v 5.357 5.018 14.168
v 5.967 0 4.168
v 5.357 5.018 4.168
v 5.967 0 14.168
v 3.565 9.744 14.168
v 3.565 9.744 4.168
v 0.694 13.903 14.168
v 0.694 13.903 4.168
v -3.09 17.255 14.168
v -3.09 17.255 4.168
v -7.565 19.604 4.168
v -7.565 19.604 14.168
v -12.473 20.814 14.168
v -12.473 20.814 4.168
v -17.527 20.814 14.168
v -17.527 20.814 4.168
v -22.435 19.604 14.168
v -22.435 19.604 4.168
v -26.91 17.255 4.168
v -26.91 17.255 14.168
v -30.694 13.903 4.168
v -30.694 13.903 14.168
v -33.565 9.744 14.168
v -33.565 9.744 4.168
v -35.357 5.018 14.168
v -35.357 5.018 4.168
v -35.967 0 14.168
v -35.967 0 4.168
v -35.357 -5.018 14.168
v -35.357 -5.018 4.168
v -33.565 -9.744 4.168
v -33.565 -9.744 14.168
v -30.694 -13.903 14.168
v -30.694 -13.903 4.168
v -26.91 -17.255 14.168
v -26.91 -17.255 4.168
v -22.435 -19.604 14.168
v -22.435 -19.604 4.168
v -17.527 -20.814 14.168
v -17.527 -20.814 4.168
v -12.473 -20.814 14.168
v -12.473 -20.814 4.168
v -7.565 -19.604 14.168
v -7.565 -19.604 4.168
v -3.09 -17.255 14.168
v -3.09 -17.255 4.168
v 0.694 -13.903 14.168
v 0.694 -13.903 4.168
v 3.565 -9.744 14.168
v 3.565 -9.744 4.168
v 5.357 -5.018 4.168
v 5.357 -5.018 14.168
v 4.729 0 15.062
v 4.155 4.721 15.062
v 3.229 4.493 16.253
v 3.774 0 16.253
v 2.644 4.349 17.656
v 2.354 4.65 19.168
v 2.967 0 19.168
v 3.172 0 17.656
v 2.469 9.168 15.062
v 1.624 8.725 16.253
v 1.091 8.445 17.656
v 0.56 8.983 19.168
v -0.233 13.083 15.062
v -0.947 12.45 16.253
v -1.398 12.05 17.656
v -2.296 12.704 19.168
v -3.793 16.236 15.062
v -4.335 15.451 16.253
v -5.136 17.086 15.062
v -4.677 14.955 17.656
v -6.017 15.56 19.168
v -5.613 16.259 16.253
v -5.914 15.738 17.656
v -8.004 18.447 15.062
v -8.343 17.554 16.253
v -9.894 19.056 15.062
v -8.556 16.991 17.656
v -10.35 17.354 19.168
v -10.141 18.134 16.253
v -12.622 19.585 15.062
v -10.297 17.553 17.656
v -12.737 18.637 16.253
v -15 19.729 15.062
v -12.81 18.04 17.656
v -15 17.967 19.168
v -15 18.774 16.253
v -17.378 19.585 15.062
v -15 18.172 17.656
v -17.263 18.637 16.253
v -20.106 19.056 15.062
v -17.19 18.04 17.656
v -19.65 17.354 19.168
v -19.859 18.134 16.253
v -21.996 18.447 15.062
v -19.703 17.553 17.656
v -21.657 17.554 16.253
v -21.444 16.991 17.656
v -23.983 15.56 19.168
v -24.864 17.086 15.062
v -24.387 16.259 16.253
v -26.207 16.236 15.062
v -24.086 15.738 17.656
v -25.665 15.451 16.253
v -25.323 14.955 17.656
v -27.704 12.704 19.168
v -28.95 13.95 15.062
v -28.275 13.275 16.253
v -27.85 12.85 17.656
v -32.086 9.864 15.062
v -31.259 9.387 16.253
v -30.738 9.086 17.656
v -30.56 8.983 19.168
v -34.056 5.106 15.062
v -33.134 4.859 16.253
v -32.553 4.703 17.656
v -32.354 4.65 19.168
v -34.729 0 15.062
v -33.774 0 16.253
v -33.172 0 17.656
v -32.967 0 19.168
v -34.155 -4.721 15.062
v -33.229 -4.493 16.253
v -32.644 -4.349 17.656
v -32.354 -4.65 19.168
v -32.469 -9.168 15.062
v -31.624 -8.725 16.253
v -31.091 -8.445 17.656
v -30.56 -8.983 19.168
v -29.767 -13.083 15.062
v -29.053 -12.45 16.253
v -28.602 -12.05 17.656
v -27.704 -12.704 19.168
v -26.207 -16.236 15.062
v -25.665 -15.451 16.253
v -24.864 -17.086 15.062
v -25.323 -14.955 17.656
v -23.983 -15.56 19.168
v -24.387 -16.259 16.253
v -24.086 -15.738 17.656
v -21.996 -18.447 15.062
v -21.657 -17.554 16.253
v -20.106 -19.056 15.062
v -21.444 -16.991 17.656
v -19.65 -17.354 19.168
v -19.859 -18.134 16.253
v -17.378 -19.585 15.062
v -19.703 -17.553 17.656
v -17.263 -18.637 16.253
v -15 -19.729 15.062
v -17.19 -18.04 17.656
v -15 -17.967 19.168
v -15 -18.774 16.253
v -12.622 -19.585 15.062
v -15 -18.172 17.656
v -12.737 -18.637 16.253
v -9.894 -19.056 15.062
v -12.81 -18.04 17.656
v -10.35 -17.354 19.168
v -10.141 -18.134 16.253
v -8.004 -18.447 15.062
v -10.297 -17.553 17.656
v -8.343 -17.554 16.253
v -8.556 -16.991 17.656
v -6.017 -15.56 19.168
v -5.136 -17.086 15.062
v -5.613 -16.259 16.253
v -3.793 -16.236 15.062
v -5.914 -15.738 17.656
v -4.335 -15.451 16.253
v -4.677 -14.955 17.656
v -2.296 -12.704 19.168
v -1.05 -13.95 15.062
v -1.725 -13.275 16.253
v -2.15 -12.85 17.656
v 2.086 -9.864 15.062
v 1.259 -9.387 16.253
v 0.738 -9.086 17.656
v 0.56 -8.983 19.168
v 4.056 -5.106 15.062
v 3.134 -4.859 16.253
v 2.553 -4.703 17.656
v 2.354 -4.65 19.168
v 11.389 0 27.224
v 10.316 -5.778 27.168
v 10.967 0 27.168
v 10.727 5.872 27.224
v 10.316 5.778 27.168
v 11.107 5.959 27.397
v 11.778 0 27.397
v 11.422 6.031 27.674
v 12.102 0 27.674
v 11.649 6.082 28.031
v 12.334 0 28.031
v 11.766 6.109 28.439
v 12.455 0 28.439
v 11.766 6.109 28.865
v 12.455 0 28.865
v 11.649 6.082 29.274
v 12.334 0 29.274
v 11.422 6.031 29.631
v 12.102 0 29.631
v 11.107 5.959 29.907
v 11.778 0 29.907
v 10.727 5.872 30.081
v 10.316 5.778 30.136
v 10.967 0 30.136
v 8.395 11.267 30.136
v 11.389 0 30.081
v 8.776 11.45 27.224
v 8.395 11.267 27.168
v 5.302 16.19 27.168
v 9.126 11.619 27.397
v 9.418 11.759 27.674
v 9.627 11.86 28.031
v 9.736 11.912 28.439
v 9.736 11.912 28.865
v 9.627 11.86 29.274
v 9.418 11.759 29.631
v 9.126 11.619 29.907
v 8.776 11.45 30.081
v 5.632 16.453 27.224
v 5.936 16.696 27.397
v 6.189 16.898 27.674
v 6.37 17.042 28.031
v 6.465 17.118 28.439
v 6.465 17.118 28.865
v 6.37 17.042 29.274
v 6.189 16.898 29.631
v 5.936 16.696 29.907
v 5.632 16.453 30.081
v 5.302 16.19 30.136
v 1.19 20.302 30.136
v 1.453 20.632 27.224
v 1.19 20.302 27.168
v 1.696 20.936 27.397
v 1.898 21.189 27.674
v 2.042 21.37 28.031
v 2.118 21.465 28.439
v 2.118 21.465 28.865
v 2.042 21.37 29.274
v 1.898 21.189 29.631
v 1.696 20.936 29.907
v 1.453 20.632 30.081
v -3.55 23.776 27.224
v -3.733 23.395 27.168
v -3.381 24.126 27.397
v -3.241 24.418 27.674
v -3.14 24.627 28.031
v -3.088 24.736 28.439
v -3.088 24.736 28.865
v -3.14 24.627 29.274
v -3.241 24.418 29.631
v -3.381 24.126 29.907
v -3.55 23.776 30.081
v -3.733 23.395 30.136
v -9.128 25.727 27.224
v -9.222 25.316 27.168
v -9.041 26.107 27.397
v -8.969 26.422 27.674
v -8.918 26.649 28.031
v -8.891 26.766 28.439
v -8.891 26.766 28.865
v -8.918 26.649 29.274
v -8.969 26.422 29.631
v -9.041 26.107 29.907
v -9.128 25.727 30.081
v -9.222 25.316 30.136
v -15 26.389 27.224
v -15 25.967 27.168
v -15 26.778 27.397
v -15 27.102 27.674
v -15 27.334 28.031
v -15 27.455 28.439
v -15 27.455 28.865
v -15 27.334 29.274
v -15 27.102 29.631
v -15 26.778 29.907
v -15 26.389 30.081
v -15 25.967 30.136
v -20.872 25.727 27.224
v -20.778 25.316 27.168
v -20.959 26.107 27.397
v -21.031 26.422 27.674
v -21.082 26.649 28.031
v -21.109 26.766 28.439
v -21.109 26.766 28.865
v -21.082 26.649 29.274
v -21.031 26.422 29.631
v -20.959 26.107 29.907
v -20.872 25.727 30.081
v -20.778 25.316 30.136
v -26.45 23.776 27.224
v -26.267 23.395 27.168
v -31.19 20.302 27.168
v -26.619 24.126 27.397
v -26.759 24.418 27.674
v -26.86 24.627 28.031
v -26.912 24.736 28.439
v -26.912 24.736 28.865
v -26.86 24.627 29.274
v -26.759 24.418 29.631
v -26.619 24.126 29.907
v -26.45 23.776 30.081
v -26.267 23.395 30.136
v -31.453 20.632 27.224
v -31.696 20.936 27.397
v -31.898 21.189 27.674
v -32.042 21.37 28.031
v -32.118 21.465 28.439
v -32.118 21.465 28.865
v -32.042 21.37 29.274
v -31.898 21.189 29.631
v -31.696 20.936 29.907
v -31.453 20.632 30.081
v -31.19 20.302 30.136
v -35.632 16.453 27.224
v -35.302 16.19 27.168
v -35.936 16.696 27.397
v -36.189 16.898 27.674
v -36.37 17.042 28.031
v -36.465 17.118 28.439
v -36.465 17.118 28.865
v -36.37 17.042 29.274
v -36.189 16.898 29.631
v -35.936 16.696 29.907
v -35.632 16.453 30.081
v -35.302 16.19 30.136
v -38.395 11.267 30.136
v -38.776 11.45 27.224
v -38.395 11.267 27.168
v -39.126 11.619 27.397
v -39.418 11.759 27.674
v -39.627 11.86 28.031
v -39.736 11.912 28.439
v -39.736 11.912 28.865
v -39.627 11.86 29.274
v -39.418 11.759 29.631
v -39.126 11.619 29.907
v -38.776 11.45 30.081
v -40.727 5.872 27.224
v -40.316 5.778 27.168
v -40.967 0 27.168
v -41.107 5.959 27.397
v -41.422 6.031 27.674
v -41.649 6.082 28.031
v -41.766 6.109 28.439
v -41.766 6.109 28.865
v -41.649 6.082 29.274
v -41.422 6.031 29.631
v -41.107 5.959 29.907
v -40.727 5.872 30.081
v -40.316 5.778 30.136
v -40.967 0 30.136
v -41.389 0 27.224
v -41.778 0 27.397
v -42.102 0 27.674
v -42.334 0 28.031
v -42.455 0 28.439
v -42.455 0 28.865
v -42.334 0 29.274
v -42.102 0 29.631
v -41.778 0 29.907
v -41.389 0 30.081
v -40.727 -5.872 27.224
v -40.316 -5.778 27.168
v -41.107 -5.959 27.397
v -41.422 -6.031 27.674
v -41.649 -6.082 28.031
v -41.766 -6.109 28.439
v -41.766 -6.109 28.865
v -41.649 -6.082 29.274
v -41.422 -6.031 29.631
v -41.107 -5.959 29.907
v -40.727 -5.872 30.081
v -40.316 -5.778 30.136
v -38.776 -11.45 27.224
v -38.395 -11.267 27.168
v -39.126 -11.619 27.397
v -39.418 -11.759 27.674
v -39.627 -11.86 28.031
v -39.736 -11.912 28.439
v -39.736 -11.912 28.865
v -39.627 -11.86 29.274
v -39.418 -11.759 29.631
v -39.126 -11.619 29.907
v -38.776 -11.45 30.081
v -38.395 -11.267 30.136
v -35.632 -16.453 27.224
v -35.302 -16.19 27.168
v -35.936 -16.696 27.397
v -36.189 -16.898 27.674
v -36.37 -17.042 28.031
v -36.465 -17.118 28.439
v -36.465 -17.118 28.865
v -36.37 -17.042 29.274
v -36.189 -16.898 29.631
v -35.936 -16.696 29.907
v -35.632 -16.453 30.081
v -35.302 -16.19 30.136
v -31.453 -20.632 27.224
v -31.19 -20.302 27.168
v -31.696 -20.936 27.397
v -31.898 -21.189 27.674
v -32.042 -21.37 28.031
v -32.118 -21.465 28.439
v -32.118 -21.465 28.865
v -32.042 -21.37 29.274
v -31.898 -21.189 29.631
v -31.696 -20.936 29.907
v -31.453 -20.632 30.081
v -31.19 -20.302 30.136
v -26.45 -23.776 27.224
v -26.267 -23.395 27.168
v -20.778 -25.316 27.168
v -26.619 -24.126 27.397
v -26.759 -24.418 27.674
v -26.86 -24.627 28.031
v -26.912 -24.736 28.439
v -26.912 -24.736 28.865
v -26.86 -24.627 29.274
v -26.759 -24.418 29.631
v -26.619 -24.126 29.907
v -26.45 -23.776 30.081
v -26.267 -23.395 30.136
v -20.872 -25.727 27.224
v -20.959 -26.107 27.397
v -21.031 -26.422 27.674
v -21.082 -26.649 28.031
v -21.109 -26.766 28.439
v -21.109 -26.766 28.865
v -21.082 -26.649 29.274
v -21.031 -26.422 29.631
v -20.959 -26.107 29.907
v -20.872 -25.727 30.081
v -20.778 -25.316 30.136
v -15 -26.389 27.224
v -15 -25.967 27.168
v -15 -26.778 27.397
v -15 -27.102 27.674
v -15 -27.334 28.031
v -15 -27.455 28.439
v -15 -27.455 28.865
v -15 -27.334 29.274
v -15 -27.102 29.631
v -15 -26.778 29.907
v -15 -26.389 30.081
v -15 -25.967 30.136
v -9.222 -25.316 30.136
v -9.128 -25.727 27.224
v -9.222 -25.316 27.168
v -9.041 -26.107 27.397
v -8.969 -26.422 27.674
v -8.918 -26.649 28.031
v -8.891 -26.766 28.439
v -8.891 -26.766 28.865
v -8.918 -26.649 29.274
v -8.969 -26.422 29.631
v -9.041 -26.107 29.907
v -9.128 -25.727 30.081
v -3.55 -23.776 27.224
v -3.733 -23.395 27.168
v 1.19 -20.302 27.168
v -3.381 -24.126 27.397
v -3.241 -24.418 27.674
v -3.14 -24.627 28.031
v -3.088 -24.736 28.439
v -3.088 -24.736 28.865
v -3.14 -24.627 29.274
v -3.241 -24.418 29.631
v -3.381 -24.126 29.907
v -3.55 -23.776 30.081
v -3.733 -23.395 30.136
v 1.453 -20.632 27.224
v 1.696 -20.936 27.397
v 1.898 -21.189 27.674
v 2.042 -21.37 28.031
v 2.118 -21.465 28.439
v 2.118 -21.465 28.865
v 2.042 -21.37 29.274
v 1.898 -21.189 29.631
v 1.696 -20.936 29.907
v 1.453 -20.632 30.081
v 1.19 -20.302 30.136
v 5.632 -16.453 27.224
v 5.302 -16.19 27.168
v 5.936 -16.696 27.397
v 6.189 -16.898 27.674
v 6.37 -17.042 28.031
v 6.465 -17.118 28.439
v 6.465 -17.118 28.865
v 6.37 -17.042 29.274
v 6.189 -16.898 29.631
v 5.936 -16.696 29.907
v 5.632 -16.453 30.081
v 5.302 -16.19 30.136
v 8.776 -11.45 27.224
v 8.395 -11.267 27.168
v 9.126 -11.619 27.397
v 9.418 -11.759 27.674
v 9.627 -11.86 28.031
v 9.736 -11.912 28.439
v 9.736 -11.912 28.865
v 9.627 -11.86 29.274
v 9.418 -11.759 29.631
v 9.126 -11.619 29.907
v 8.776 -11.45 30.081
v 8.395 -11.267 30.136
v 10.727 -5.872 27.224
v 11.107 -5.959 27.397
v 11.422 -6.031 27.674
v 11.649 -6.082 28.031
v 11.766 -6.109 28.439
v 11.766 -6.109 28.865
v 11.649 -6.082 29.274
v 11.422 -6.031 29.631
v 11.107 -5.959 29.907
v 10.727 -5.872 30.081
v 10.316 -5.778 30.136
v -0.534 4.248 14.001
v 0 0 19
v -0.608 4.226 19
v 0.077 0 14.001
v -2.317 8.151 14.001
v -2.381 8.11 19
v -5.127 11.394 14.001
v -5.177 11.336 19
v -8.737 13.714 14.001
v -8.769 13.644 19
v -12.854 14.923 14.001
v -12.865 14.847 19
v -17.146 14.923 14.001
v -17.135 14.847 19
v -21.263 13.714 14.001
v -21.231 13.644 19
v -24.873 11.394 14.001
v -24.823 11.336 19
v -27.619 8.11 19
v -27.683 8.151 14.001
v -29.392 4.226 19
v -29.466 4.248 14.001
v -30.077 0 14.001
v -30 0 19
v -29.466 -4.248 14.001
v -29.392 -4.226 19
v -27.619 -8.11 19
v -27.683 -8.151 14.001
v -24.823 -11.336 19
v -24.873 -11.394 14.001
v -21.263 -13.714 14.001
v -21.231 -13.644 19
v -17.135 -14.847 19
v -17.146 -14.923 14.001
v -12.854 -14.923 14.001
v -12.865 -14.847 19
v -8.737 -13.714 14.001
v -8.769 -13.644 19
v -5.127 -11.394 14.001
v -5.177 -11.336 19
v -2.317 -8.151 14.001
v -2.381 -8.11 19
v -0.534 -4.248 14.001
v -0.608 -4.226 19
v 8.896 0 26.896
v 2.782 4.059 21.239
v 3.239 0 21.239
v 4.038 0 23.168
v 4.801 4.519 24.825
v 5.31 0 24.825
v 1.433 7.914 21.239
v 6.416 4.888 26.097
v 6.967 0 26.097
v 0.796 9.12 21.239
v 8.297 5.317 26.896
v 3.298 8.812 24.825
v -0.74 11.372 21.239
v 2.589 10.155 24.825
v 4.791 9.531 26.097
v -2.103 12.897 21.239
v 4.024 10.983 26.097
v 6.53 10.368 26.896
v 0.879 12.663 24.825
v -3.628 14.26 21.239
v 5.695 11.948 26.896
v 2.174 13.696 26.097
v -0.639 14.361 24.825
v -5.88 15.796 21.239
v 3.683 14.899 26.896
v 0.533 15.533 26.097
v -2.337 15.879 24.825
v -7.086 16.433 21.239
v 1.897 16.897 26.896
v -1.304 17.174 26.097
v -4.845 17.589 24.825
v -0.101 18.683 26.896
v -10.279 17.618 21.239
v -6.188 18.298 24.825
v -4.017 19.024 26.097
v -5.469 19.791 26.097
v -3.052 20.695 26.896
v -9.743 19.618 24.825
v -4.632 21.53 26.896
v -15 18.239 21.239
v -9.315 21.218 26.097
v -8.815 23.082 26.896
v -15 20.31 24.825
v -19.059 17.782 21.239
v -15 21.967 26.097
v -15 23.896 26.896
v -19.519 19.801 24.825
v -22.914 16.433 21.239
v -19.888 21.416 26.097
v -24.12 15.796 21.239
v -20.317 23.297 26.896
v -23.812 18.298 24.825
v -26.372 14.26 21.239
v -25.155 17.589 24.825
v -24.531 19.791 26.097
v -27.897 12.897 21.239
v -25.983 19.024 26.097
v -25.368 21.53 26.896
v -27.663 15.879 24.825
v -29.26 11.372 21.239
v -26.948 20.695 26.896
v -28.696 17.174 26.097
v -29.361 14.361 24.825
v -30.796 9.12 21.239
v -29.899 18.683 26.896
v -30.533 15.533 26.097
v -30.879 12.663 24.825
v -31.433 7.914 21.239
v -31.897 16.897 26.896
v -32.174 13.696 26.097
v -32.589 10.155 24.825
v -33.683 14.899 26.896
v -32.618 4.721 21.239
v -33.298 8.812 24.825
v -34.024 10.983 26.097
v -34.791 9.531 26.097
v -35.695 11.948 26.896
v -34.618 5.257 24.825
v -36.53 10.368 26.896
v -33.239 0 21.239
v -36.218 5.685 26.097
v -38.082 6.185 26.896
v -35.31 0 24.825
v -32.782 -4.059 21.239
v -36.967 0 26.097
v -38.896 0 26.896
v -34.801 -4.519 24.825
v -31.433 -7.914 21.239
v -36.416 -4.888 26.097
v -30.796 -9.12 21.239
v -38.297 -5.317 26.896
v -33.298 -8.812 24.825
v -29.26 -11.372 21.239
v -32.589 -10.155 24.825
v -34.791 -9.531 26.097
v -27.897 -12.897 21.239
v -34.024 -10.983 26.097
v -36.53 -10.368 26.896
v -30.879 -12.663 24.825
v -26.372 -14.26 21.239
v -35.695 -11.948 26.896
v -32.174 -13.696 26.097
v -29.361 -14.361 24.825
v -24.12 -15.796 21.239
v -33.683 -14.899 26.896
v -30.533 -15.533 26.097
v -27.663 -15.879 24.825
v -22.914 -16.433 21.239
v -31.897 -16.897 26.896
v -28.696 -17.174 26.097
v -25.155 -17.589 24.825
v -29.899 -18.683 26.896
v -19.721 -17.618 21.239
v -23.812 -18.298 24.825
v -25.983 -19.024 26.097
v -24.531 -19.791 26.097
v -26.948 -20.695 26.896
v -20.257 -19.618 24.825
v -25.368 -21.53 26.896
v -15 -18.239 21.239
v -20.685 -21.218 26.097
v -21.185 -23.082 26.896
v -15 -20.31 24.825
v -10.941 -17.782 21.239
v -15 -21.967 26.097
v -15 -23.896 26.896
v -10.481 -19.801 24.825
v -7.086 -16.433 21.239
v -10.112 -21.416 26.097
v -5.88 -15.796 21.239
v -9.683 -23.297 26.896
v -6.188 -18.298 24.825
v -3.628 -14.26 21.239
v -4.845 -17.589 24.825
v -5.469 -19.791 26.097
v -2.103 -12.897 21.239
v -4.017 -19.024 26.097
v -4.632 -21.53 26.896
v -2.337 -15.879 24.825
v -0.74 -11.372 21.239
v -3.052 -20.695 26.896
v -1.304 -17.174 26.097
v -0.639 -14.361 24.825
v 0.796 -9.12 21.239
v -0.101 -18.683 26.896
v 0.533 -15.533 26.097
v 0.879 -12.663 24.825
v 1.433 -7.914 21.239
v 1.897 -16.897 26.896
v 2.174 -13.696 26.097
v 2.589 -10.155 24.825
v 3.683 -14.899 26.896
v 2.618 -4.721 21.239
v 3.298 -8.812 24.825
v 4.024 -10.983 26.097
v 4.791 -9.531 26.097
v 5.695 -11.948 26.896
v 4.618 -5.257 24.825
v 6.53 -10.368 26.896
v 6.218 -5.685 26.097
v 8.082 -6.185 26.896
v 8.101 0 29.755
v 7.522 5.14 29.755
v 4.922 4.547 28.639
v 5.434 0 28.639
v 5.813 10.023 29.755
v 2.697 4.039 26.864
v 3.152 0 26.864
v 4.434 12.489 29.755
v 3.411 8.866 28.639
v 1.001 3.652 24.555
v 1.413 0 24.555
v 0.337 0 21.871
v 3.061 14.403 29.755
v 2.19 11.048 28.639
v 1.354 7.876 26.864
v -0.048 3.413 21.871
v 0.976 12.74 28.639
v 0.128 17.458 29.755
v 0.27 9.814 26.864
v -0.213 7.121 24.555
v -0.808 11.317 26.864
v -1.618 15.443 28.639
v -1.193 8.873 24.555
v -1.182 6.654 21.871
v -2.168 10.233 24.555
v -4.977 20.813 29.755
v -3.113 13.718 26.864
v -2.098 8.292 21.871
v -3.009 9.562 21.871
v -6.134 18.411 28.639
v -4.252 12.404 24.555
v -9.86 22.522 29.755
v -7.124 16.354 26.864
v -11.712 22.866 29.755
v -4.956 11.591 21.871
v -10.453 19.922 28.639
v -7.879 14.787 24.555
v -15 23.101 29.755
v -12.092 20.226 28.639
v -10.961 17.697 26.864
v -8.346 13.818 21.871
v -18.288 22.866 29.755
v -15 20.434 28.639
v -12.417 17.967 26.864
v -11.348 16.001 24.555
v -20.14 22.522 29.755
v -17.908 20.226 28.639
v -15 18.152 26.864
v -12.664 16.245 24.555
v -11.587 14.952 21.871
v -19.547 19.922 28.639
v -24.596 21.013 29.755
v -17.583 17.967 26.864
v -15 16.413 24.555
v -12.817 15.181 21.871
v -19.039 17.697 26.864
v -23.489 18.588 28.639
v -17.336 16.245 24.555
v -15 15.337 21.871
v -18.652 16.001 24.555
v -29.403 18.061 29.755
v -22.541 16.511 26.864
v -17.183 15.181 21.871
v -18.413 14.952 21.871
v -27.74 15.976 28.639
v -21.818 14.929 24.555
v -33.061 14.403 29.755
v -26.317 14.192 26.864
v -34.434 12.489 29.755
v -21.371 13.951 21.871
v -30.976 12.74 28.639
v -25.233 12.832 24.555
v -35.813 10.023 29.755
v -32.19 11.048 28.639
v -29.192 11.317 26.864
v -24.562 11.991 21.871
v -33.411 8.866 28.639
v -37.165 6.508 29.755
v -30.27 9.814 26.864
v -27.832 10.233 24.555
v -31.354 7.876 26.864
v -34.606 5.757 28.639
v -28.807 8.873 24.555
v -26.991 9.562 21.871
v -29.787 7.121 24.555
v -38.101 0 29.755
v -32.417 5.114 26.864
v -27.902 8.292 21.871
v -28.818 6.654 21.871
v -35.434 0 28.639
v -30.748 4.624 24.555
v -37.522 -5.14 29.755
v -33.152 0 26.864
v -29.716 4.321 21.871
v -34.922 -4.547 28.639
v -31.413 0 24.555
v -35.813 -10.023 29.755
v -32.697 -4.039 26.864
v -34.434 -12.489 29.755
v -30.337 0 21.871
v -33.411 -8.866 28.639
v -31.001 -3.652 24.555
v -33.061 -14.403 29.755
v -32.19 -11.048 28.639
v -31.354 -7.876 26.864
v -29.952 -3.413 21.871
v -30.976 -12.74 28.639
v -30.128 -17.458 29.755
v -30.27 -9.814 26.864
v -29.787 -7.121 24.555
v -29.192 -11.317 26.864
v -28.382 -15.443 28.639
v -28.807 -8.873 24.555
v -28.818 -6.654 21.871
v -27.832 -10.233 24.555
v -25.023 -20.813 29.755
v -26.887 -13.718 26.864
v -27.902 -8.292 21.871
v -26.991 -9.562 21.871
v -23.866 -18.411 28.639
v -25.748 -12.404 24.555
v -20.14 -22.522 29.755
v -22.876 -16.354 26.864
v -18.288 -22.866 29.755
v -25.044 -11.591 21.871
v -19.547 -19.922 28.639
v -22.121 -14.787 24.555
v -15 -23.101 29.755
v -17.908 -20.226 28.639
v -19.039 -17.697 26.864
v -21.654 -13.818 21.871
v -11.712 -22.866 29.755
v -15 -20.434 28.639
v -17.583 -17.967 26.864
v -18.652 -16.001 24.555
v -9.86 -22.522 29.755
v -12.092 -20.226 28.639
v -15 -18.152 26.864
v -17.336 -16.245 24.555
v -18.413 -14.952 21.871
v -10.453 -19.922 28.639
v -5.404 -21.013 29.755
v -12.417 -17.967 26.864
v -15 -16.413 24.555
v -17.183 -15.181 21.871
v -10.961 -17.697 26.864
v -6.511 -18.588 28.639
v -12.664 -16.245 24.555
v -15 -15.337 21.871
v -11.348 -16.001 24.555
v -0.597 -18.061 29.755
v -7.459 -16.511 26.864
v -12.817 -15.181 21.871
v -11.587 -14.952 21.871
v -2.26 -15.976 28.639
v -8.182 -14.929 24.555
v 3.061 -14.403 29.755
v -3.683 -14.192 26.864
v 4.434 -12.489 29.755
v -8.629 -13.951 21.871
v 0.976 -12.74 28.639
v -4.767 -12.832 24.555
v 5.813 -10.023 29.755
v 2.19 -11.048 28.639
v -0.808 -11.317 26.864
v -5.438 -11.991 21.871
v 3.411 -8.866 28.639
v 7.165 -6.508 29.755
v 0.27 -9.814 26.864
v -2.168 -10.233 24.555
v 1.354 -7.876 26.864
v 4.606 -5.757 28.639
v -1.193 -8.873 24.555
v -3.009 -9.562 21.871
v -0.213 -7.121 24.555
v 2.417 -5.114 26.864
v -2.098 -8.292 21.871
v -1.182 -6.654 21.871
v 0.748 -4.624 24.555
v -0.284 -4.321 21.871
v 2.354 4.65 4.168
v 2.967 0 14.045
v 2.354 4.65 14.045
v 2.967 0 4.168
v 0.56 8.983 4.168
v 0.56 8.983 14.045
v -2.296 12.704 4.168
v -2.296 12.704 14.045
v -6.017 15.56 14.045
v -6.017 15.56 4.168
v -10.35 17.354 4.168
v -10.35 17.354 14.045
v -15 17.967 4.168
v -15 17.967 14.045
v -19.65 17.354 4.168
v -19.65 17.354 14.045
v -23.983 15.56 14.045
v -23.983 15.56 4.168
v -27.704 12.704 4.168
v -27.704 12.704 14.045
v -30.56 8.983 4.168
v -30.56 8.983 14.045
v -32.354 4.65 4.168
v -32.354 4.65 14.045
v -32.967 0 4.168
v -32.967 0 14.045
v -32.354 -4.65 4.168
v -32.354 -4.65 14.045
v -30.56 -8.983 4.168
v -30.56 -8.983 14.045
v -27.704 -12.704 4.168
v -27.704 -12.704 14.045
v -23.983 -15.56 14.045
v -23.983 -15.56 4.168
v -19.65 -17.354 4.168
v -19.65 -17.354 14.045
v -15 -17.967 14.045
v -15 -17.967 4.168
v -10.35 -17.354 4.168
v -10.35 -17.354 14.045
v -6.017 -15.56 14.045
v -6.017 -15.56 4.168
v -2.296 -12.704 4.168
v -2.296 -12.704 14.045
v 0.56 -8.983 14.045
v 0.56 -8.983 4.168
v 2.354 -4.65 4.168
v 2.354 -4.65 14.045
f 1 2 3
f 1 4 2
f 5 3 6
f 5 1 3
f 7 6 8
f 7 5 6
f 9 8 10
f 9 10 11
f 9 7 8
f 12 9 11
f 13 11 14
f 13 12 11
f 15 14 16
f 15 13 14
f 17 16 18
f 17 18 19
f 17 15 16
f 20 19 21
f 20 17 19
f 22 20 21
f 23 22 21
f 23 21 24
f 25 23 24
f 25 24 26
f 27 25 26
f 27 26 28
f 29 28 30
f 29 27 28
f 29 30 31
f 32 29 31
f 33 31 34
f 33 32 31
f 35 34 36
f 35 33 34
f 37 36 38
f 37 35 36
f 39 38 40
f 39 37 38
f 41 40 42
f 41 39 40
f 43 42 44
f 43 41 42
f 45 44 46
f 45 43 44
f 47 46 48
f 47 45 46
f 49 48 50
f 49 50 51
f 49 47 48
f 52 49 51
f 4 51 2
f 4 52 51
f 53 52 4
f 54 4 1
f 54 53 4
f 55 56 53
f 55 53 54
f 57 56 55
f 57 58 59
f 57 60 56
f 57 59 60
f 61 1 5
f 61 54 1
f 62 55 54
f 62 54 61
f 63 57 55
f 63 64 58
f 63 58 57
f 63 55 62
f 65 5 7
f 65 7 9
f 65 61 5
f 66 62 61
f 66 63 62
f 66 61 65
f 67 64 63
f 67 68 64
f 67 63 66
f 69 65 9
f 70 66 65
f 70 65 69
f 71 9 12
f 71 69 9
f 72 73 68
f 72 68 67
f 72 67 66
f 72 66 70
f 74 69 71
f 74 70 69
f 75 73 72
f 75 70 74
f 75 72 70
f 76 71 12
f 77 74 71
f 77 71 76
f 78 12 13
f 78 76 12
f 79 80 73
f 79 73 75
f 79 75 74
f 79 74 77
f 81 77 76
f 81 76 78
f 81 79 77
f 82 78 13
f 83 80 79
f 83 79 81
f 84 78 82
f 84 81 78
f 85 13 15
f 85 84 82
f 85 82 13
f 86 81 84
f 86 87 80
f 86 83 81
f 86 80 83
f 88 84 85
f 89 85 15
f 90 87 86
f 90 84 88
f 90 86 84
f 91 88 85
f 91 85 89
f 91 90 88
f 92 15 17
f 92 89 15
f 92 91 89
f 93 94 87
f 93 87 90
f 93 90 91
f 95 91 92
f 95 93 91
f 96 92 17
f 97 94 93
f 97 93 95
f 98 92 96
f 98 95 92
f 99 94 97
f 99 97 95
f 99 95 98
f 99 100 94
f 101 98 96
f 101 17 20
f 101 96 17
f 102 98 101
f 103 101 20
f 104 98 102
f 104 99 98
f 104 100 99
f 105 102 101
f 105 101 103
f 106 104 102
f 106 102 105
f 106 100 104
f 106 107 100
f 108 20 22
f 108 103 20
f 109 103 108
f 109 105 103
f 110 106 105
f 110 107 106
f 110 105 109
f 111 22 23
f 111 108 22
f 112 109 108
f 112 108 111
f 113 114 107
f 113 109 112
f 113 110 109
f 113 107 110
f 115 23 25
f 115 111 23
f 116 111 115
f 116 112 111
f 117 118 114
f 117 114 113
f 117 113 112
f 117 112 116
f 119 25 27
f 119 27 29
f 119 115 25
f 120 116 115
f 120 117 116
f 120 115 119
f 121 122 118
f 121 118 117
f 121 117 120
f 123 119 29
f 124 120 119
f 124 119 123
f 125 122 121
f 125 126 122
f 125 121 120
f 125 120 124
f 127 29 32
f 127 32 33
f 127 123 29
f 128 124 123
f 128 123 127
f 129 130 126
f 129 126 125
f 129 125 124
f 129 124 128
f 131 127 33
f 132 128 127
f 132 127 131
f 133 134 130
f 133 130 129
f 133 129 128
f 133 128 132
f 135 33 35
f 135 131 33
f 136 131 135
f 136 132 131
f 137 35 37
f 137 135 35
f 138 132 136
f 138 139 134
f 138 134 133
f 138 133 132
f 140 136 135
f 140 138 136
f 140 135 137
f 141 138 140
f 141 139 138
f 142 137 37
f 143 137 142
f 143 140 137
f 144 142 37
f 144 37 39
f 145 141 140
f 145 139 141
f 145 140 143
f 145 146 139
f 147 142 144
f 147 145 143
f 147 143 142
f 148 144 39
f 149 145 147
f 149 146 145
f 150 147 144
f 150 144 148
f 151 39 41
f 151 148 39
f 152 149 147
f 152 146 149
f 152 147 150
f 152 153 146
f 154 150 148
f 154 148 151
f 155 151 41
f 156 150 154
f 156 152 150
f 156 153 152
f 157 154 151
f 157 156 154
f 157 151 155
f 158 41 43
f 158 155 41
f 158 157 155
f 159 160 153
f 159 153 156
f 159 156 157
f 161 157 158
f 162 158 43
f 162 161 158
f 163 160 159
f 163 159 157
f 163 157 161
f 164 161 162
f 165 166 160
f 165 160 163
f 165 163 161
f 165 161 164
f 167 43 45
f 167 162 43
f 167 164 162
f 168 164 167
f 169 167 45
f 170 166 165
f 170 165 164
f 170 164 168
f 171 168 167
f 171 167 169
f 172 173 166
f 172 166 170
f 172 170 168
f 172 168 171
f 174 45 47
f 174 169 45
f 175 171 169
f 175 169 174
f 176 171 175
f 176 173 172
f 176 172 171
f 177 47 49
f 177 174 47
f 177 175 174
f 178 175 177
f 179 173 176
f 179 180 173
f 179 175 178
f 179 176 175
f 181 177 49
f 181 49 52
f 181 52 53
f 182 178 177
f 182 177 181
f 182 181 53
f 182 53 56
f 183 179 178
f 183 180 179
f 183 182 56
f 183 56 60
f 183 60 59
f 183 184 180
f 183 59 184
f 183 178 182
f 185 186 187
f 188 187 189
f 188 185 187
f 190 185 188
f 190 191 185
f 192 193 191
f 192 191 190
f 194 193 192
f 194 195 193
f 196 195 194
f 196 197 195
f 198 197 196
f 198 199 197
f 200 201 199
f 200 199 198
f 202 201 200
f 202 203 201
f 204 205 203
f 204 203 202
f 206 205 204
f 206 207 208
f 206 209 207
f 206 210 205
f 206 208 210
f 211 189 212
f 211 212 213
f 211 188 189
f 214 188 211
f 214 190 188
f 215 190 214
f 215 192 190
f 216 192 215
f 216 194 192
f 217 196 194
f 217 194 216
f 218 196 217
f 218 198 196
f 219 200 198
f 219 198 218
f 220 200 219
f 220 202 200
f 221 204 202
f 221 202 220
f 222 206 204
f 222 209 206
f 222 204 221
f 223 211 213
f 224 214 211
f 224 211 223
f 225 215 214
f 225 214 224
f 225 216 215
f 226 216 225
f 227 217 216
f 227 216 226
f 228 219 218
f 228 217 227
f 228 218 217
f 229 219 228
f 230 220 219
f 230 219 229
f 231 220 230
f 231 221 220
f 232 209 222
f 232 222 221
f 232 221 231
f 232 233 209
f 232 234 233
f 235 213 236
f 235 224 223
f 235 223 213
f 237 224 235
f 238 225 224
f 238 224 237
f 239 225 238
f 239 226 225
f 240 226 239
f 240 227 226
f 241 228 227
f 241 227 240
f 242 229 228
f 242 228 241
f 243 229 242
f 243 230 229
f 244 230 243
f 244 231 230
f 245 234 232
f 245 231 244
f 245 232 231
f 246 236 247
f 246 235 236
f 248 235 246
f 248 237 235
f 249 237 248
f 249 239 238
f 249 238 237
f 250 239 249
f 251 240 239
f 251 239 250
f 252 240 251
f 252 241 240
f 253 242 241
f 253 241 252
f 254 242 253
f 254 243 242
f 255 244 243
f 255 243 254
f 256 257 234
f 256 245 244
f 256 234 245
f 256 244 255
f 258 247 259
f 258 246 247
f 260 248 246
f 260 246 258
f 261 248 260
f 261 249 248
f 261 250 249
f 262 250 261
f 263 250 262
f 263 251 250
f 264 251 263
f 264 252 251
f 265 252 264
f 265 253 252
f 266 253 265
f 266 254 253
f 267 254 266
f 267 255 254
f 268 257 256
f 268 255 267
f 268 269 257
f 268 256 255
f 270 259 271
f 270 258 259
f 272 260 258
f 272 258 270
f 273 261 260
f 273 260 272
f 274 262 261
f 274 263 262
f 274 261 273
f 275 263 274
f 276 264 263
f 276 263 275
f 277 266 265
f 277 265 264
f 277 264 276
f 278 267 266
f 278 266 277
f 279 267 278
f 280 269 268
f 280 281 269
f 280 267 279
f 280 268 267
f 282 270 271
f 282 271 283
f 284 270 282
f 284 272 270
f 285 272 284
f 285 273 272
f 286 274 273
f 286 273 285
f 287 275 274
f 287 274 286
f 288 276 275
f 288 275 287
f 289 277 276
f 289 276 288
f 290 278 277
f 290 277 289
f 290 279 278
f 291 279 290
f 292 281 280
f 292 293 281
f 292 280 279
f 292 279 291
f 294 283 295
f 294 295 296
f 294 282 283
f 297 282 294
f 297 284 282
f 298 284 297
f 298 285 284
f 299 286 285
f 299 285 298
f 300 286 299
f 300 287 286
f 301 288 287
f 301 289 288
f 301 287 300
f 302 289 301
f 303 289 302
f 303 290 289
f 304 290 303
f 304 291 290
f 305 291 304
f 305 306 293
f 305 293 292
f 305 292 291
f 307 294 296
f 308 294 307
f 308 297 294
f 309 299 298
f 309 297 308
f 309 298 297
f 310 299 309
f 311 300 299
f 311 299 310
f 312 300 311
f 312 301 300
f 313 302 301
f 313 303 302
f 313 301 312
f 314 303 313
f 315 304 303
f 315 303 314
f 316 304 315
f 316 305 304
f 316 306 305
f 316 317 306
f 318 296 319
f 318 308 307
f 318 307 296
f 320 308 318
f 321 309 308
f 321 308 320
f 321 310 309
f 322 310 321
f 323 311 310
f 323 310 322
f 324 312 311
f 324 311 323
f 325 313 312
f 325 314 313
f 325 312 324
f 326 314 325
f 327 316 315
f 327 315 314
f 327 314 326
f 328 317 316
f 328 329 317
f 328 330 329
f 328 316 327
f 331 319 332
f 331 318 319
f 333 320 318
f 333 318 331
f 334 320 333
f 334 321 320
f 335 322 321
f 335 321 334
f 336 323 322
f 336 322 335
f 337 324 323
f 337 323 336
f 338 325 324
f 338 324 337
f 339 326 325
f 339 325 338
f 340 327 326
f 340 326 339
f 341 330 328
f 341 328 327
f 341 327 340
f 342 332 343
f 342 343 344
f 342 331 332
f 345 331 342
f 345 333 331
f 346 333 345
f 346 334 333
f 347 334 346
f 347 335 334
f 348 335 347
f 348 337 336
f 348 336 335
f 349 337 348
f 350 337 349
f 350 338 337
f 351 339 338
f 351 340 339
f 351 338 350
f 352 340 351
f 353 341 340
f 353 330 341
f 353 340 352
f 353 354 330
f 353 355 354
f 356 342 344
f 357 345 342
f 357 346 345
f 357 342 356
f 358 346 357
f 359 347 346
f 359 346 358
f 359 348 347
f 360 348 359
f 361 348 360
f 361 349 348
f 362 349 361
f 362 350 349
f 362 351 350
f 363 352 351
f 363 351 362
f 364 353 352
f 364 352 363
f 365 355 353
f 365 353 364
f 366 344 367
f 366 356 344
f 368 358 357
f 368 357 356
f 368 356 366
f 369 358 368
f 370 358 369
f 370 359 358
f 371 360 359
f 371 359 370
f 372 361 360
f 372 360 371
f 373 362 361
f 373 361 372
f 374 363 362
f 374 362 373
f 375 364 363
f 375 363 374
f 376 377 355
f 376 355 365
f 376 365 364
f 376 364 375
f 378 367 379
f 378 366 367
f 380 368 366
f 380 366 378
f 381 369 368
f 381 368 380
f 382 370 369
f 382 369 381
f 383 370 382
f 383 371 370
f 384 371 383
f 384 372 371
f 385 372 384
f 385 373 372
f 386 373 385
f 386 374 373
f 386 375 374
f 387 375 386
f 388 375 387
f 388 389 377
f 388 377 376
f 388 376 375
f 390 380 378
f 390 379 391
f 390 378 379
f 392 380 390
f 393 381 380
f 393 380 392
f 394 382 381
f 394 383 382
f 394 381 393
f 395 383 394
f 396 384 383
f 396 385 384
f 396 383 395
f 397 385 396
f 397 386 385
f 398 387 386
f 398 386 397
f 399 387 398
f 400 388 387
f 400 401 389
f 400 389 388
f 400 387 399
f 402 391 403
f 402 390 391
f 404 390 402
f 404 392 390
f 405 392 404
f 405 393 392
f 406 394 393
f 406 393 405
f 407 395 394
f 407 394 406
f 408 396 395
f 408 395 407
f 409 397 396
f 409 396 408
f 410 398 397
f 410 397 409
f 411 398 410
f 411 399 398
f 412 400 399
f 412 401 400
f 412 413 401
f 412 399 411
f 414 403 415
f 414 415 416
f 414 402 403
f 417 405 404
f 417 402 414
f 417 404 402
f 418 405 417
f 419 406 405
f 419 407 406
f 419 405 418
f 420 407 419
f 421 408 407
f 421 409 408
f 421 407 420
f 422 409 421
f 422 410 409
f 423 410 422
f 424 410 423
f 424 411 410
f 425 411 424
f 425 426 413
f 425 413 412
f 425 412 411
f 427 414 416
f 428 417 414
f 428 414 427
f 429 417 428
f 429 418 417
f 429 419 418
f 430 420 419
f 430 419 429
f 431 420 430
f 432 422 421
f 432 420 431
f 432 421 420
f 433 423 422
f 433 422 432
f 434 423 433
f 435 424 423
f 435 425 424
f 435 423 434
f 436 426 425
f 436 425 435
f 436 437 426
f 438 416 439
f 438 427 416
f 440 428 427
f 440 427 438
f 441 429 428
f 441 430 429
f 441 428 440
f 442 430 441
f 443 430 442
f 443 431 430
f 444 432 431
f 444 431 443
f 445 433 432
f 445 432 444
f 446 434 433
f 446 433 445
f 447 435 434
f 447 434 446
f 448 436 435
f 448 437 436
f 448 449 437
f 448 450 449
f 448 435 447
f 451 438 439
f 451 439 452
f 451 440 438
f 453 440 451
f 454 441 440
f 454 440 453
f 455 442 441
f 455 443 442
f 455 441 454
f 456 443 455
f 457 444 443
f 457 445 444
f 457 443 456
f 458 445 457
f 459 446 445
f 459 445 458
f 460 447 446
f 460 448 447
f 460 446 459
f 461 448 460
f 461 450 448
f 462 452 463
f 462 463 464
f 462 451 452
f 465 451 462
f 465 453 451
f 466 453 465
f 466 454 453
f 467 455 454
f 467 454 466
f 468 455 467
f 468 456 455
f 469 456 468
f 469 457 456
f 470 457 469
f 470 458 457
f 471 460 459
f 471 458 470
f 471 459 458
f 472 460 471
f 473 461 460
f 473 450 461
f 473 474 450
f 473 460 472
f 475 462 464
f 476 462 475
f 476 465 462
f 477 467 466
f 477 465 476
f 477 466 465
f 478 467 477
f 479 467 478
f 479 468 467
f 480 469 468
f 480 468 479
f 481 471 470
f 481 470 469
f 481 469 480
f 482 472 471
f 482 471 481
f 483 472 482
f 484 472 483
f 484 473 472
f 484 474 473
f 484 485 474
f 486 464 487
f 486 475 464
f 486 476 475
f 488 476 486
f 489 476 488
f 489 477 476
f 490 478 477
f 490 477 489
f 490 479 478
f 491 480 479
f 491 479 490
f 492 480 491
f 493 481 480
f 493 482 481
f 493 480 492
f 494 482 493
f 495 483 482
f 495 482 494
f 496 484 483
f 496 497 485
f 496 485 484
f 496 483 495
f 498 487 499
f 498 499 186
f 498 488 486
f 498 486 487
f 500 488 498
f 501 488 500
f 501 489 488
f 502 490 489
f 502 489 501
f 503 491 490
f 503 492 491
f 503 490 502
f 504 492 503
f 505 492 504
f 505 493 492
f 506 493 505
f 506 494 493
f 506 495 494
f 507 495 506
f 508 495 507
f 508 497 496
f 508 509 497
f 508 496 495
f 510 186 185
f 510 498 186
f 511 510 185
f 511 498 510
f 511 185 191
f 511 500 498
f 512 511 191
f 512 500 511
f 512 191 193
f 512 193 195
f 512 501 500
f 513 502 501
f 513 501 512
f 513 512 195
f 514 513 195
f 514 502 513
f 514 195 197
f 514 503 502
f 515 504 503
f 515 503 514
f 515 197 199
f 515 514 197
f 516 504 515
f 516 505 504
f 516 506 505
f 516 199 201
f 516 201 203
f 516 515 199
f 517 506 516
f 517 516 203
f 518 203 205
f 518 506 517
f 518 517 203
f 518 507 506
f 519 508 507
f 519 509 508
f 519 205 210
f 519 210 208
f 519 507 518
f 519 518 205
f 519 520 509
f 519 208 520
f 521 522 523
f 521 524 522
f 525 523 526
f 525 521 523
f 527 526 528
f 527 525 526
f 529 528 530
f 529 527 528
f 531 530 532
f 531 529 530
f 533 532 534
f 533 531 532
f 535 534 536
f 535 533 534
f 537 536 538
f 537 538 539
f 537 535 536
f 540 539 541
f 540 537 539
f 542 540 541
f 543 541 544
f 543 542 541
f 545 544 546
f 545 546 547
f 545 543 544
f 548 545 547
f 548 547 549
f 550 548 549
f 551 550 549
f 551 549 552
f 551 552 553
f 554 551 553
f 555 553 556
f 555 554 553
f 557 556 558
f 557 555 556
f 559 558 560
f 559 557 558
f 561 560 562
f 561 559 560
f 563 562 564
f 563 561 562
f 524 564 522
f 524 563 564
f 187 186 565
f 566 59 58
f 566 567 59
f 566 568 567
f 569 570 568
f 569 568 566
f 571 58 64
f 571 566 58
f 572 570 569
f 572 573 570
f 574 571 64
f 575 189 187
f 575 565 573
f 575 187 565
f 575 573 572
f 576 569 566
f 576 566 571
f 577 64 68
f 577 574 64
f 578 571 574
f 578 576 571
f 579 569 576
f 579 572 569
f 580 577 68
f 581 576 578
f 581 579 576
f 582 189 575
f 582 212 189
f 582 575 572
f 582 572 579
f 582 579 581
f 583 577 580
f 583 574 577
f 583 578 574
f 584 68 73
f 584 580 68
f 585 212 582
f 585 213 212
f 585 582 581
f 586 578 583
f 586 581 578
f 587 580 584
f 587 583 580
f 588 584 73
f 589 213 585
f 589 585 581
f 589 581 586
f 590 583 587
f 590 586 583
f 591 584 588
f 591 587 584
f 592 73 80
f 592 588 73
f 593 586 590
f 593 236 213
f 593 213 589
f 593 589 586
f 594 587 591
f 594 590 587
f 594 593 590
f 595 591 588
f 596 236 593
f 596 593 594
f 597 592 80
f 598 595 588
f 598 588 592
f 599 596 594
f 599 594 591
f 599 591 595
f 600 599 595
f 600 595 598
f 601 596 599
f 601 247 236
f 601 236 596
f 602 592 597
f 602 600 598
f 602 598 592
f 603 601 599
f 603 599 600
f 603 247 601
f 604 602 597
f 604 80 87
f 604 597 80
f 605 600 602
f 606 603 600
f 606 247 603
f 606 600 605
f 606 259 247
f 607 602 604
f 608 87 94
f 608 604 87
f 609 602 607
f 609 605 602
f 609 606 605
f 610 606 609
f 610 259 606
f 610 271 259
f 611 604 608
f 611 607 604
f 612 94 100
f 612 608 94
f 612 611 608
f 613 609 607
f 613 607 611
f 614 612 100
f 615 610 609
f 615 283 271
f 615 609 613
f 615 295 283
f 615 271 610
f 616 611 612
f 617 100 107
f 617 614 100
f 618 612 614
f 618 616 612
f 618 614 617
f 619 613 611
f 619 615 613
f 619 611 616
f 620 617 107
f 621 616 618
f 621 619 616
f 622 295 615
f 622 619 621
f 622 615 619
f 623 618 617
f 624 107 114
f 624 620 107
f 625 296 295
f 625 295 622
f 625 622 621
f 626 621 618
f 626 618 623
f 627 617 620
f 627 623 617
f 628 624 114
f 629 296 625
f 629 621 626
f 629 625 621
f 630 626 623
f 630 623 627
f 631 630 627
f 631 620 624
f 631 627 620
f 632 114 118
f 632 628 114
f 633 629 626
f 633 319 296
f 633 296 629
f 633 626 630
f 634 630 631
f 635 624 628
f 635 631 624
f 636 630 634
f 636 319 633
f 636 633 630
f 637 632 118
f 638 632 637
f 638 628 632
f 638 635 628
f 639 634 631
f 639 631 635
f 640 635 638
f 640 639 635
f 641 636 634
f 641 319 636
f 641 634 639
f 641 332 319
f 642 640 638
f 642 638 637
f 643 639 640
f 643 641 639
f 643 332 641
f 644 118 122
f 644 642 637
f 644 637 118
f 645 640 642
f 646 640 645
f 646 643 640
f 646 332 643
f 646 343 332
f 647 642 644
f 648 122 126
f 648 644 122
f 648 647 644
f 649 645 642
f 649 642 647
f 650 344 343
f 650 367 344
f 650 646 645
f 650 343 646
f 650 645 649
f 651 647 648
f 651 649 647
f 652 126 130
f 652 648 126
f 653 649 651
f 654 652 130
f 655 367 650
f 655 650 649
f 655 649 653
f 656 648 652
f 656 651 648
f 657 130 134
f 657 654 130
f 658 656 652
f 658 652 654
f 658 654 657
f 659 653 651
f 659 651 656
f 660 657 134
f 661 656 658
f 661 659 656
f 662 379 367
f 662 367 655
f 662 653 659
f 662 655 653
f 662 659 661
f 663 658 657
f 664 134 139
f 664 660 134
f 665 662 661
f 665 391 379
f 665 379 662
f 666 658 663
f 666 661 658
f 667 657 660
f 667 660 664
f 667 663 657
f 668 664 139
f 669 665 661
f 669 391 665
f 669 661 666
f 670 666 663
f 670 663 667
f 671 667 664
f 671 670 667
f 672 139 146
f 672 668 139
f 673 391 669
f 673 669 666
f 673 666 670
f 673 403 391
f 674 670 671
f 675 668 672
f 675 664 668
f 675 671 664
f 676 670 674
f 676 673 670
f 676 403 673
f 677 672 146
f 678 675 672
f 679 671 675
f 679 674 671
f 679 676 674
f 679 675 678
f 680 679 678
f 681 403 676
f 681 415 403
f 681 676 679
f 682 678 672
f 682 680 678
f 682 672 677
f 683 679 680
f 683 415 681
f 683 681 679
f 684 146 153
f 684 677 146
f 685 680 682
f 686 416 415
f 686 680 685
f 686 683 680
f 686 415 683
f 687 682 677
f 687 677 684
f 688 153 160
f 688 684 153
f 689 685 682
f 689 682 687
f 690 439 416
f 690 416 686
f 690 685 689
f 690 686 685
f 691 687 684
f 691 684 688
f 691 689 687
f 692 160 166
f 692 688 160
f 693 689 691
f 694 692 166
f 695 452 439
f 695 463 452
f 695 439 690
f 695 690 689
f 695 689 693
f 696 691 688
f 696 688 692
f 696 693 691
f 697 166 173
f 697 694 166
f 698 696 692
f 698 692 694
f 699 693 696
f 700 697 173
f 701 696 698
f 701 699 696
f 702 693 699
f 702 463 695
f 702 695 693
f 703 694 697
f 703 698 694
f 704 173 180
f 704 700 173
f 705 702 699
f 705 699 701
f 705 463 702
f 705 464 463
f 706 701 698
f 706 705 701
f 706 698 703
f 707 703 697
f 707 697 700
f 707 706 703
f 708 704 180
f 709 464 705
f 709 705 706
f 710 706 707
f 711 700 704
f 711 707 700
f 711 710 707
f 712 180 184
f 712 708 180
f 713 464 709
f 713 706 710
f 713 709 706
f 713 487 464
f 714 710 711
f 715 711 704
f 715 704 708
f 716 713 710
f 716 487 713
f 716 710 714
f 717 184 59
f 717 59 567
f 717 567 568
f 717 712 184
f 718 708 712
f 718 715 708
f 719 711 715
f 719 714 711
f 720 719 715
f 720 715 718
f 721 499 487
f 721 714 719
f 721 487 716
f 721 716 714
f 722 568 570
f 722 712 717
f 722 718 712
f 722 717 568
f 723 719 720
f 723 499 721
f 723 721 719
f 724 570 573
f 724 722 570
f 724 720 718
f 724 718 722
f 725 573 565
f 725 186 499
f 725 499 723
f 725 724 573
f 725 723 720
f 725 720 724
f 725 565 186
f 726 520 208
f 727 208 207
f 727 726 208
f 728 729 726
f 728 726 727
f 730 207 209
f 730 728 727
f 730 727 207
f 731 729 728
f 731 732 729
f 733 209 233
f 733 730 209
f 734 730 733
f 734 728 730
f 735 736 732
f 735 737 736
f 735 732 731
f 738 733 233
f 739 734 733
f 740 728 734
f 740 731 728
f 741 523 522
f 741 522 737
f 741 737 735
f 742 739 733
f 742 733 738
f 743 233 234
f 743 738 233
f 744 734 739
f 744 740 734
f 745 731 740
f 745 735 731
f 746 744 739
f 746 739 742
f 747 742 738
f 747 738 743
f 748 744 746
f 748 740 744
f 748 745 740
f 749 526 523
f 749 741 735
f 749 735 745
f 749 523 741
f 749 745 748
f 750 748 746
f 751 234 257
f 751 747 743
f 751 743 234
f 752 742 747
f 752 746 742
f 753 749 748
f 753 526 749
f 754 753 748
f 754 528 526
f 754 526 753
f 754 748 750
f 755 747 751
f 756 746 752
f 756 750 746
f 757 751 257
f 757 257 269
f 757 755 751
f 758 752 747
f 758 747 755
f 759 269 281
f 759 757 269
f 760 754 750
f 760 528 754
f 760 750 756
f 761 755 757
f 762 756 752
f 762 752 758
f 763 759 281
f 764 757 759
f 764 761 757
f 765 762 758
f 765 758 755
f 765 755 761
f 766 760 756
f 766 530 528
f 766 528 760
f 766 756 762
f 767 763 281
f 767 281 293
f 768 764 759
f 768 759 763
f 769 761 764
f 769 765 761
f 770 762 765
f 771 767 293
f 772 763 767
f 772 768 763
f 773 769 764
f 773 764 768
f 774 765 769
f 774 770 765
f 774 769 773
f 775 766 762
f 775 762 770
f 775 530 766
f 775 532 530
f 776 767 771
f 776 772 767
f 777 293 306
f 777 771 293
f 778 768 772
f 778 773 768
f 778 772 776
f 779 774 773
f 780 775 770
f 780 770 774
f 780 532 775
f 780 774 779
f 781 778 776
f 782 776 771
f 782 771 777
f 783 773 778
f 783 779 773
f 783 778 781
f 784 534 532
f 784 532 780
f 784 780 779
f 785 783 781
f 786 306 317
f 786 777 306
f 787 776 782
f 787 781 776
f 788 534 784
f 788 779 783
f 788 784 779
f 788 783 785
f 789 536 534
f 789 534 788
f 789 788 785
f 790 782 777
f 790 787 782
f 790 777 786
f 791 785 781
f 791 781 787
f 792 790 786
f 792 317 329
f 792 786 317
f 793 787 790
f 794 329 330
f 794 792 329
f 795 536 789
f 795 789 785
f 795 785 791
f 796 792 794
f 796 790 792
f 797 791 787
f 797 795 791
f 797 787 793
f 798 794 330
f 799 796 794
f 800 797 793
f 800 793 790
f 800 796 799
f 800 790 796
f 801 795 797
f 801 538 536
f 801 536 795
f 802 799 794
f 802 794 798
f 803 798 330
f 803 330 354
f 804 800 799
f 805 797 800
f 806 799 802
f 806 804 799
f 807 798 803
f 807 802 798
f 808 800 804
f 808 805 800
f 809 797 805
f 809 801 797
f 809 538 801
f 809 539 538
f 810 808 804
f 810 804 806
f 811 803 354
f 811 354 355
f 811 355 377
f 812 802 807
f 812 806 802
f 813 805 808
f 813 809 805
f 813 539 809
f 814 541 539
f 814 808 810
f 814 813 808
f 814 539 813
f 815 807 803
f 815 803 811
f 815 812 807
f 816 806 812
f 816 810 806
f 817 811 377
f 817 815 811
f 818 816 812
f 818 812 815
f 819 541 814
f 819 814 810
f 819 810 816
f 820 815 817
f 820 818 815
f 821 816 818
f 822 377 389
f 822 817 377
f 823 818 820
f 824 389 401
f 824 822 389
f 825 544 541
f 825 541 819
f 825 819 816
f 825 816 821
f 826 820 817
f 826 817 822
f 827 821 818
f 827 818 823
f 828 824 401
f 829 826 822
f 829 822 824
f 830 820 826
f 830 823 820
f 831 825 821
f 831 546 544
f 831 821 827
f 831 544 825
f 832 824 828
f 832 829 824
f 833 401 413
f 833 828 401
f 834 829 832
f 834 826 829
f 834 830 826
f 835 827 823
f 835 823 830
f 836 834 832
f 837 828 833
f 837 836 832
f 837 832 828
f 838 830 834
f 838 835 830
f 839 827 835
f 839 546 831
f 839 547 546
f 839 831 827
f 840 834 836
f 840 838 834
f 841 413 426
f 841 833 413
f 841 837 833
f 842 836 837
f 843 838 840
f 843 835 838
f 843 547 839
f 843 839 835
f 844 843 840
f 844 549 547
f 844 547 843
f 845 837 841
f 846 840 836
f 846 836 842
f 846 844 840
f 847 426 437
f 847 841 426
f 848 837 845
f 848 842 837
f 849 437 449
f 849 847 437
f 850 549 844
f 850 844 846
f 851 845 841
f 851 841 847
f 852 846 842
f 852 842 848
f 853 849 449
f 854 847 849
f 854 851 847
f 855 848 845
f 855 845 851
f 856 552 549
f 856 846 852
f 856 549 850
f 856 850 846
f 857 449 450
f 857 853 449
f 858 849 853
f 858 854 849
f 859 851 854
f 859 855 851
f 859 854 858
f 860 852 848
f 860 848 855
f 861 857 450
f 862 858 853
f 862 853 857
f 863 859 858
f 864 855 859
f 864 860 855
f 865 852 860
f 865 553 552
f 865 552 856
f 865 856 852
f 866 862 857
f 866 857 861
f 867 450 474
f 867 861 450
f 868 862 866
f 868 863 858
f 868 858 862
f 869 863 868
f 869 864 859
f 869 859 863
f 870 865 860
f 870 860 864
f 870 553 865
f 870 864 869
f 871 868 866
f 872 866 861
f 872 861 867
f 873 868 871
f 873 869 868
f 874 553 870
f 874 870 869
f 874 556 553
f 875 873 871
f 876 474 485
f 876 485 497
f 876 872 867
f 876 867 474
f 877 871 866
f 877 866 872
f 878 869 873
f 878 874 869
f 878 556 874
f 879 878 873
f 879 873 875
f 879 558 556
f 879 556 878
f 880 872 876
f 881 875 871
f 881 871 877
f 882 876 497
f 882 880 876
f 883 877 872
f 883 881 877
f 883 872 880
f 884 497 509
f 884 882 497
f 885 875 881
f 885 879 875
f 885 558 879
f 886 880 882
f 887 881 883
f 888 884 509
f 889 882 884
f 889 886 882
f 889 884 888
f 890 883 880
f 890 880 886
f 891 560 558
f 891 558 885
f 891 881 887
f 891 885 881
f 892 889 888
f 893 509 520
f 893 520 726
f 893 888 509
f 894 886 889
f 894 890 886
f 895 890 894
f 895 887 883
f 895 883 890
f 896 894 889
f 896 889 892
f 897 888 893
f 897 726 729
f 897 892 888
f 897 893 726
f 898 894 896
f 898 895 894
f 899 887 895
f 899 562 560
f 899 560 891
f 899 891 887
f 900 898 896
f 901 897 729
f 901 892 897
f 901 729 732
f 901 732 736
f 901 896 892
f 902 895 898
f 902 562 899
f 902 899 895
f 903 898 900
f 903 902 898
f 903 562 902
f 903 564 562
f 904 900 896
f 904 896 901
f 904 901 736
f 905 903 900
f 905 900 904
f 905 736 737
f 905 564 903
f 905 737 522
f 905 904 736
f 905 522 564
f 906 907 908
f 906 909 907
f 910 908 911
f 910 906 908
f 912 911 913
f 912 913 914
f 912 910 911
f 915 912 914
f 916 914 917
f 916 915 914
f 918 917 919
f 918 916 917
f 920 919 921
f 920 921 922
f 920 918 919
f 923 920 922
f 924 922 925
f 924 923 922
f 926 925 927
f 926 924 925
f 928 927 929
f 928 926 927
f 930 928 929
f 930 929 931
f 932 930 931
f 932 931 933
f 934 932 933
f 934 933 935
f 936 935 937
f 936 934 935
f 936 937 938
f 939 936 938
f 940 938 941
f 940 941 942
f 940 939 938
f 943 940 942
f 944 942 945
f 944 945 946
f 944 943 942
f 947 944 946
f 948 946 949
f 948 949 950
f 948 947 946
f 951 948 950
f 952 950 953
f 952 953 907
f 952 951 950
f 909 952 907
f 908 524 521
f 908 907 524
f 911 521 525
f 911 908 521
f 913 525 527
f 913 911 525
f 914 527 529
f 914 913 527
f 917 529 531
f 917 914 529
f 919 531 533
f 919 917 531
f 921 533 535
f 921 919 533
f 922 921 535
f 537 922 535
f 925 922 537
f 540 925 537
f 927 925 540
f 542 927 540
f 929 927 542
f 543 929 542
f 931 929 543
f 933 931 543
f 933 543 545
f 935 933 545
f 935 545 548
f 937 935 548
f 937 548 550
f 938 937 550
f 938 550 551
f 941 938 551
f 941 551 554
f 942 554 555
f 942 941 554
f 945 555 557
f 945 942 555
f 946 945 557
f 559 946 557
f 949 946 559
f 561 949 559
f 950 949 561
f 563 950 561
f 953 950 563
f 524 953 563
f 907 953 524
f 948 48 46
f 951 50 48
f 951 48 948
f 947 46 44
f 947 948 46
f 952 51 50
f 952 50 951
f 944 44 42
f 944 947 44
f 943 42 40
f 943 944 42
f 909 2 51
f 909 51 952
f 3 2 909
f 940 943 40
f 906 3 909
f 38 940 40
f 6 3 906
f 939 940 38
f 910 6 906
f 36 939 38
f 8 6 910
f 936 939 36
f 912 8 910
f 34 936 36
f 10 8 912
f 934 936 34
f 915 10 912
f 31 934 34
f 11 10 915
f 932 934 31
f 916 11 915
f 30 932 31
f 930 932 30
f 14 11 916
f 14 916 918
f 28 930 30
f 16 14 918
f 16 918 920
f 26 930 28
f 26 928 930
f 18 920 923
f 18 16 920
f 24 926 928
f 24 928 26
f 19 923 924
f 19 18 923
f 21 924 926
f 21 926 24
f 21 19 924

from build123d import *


# Not quite as in the source:
# - a feature of the source that left no trace in its solid (it failed there, or was rolled back) is left out
# - a feature names something its author has since deleted; it is built from what else it names


with BuildPart() as f1:
    # F0 (on Front) → F1 (revolve)
    with BuildSketch(Plane.XZ):
        with BuildLine():
            ThreePointArc((10.9666396311, 27.1683829889), (12.4701625396, 28.6523491091), (10.9666396311, 30.1363152292))
            ThreePointArc((10.9666396311, 30.1363152292), (3.1518347441, 26.8641196143), (0, 19))
            Line((0, 19), (0.0767615013, 14.0005892675))
            Line((0.0767615013, 14.0005892675), (2.9666396311, 14.0449607736))
            Line((2.9666396311, 14.0449607736), (2.9666396311, 4.1683829889))
            Line((2.9666396311, 4.1683829889), (5.9666396311, 4.1683829889))
            Line((5.9666396311, 4.1683829889), (5.9666396311, 14.1683829889))
            ThreePointArc((5.9666396311, 14.1683829889), (3.7741797187, 16.2529070415), (2.9666396311, 19.1683829889))
            ThreePointArc((2.9666396311, 19.1683829889), (5.3097853816, 24.8252372384), (10.9666396311, 27.1683829889))
        make_face()
    revolve(axis=Axis((-15, 0, 28.4551028162), (0, 0, 1)))


solid = f1.part
